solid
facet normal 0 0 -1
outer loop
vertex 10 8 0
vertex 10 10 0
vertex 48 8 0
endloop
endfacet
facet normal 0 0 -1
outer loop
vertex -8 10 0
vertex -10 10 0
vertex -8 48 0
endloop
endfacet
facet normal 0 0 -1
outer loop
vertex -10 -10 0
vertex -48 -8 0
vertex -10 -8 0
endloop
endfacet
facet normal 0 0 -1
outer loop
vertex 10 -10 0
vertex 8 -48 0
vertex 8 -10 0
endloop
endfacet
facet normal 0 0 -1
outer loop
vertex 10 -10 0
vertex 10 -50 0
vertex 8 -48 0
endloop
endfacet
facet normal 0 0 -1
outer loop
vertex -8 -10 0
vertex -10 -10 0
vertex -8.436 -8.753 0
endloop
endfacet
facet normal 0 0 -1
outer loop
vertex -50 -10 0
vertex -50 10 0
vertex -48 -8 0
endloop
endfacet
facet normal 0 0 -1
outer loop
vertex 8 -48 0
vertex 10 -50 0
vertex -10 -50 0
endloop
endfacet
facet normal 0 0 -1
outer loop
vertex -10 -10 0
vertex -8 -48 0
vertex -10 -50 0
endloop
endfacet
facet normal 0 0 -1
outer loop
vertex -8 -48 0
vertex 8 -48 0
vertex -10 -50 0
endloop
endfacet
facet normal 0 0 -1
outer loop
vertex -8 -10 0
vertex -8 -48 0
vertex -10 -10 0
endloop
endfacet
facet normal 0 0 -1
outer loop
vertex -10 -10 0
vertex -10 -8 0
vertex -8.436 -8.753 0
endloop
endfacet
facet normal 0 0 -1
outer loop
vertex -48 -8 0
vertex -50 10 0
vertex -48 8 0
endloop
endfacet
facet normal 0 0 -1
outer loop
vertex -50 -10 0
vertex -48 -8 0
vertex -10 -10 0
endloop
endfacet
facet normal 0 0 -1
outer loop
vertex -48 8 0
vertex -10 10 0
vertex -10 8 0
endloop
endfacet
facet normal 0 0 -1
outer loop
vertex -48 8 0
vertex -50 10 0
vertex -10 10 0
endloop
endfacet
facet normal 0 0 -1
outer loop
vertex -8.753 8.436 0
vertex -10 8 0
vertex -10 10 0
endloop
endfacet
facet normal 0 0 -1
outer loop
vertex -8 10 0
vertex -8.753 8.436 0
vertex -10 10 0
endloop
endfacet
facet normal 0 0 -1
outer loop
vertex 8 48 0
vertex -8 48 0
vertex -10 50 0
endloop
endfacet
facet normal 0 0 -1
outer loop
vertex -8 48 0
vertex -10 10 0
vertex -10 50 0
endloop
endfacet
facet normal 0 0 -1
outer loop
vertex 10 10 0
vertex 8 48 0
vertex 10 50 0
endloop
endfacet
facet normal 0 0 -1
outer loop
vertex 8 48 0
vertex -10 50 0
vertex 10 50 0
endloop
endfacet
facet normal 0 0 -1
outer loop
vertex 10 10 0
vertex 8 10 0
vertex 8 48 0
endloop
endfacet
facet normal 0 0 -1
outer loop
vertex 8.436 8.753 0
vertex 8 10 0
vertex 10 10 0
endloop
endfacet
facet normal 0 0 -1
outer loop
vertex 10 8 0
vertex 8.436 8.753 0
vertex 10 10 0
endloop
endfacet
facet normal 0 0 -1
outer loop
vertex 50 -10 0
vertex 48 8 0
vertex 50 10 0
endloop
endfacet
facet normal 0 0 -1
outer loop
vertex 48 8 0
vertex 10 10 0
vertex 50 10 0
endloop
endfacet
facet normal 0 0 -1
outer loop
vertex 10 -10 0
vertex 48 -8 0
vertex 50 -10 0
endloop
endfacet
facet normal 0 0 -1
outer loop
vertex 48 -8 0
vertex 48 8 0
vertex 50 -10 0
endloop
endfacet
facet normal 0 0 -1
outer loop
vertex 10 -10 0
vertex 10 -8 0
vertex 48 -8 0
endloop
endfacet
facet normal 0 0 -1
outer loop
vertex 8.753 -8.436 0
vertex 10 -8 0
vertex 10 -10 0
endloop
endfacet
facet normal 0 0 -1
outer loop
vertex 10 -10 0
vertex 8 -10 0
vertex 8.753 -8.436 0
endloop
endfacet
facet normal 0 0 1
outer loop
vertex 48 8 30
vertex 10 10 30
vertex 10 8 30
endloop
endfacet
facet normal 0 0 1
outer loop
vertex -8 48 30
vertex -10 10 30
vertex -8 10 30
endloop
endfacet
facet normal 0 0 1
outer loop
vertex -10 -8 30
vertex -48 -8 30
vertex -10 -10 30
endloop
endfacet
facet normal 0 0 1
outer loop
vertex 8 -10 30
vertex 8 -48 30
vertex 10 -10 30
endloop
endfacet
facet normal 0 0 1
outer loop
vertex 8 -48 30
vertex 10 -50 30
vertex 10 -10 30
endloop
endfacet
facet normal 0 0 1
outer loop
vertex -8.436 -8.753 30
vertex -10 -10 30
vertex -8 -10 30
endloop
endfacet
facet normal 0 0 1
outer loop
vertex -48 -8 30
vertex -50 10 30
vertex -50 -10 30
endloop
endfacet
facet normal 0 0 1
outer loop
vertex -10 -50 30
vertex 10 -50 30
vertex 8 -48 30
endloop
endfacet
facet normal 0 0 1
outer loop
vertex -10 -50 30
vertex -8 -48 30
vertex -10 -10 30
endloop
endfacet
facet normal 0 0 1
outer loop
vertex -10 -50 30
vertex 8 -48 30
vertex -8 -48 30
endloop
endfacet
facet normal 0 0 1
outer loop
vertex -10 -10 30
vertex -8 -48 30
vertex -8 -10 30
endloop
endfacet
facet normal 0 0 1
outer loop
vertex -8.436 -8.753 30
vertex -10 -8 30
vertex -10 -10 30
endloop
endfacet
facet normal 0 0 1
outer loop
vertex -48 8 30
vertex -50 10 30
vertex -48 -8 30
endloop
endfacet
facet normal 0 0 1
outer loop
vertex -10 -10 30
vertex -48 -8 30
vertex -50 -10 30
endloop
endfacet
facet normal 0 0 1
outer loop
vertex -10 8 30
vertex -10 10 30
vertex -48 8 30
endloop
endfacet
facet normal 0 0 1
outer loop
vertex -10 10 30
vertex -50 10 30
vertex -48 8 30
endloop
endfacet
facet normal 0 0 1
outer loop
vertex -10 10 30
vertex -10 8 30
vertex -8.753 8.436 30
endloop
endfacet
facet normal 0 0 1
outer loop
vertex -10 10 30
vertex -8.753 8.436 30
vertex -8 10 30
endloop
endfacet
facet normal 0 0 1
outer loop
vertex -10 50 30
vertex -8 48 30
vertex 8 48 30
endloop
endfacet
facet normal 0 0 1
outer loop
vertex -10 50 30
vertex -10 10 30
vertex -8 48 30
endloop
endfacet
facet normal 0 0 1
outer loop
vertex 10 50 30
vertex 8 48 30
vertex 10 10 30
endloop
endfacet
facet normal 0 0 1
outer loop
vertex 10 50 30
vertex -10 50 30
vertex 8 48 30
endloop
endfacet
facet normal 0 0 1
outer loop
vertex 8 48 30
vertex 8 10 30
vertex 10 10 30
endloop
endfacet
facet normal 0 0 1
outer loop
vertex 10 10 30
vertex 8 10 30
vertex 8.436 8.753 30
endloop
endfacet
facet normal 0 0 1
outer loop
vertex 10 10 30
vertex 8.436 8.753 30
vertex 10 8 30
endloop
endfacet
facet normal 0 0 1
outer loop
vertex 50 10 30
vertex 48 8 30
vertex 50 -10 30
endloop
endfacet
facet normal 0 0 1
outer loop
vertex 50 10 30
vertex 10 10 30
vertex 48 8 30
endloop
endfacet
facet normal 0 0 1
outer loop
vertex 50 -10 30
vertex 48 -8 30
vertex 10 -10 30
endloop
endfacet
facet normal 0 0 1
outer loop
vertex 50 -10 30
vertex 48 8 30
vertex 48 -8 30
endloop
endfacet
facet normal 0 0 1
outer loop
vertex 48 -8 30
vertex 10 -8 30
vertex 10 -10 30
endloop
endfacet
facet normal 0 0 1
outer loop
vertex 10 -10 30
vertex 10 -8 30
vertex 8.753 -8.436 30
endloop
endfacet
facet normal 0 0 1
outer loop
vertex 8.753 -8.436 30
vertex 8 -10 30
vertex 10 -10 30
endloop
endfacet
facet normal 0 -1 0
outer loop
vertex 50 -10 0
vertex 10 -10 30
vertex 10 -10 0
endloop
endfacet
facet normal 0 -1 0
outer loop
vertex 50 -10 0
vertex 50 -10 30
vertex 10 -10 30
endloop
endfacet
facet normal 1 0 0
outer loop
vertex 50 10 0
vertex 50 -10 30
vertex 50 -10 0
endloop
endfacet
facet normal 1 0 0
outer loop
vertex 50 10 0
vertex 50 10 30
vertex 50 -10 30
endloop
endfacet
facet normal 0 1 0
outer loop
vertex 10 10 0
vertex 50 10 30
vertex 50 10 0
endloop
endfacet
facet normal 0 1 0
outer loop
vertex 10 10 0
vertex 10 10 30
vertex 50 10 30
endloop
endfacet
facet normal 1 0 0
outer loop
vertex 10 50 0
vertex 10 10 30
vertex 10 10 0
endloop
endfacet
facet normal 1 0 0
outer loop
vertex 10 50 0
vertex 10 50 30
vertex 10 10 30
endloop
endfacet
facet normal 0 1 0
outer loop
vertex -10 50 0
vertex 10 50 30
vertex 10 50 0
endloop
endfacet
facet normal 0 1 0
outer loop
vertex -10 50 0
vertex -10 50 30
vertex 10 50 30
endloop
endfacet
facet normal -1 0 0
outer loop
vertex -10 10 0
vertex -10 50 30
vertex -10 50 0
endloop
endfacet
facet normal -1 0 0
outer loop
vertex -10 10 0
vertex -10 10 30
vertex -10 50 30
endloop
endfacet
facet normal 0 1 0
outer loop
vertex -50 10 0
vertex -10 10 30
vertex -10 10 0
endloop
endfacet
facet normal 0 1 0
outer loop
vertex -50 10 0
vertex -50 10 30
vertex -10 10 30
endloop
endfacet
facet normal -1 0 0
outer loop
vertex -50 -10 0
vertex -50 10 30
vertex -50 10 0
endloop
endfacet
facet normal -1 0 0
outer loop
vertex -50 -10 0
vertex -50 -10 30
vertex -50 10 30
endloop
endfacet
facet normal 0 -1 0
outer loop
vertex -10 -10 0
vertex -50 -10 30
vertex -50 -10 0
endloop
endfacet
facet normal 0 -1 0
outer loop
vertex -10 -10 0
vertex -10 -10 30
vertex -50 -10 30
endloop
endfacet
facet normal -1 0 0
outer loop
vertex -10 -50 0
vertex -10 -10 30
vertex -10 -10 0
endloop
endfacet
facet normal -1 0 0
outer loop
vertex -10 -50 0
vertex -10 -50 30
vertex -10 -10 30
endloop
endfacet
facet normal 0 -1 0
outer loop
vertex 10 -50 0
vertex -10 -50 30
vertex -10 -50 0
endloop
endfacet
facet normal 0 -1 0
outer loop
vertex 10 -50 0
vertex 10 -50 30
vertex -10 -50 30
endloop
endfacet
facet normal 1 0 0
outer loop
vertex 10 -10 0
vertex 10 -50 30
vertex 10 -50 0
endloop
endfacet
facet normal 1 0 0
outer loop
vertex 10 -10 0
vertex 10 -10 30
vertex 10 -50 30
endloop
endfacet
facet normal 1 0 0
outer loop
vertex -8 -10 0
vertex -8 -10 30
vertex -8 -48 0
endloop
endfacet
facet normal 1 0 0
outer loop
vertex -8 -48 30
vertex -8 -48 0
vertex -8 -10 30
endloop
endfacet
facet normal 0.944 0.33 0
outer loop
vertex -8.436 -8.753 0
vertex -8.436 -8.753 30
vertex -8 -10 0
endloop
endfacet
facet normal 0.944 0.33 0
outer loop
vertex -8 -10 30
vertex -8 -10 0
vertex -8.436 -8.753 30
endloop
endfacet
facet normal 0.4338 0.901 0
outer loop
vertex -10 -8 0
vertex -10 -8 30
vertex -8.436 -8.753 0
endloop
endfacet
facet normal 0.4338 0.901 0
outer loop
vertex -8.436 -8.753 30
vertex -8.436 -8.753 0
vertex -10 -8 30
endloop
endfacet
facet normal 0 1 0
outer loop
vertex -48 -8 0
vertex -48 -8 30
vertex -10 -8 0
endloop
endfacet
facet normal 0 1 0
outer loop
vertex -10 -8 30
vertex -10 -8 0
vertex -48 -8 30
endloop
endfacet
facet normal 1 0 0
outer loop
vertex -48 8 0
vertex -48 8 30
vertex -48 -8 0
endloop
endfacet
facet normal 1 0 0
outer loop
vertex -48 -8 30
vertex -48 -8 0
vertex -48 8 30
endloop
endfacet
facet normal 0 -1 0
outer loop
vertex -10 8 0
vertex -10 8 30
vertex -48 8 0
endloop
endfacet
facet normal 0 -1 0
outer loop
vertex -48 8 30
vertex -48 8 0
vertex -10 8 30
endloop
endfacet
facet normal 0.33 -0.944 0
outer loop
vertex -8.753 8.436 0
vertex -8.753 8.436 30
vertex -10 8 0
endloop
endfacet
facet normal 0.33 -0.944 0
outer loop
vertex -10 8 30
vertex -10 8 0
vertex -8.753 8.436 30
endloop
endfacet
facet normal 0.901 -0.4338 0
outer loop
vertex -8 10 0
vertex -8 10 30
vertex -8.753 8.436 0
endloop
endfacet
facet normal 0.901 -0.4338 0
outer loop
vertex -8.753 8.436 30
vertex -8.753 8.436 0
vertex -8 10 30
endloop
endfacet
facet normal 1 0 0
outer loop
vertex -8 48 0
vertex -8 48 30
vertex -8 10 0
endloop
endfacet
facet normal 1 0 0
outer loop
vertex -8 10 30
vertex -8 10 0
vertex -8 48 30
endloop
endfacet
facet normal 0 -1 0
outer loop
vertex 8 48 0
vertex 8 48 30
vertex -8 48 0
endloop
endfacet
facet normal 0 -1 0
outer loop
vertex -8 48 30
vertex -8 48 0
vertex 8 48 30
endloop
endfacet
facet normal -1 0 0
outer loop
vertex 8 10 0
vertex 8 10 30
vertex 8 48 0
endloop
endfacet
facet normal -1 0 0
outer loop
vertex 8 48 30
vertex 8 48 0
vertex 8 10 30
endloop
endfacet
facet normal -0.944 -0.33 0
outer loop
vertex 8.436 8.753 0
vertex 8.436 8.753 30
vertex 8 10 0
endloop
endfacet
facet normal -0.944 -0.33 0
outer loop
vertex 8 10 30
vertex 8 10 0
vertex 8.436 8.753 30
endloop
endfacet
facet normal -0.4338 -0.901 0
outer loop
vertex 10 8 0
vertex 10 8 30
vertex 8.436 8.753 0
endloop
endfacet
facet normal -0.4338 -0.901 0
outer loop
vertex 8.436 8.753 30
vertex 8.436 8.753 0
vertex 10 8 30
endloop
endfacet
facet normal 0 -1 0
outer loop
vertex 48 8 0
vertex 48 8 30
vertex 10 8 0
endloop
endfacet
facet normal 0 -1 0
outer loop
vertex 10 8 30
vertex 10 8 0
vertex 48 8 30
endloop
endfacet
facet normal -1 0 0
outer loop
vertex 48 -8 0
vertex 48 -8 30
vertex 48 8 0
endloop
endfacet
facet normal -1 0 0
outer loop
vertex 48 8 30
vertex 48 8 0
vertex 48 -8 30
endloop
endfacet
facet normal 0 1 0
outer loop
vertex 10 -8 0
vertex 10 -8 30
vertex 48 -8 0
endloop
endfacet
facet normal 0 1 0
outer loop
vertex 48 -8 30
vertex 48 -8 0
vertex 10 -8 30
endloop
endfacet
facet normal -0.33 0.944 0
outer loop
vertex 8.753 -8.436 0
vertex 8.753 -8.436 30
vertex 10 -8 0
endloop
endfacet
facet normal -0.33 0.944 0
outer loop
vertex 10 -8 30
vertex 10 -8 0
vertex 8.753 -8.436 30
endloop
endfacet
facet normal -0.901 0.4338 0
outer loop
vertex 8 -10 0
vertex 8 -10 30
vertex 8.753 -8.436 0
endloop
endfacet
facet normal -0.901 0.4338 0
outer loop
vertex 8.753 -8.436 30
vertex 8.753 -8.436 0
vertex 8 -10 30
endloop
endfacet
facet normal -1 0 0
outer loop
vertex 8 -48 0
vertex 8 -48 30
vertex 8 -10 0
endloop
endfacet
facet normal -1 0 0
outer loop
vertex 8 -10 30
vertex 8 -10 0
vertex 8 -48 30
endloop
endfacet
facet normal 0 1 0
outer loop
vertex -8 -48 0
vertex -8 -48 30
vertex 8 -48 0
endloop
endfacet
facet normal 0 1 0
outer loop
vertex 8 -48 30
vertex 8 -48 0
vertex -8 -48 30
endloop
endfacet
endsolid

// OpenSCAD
// file: parameter_cross_module.scad
module cross(width=30, length=100) {
  square(size=[length, width], center=true);
  square(size=[width, length], center=true);
}
// main file
use <parameter_cross_module.scad>

linear_extrude(30) {
  difference() {
    cross(100, 20);
    offset(-2) {
      cross(100, 20);
    }
  }
}
